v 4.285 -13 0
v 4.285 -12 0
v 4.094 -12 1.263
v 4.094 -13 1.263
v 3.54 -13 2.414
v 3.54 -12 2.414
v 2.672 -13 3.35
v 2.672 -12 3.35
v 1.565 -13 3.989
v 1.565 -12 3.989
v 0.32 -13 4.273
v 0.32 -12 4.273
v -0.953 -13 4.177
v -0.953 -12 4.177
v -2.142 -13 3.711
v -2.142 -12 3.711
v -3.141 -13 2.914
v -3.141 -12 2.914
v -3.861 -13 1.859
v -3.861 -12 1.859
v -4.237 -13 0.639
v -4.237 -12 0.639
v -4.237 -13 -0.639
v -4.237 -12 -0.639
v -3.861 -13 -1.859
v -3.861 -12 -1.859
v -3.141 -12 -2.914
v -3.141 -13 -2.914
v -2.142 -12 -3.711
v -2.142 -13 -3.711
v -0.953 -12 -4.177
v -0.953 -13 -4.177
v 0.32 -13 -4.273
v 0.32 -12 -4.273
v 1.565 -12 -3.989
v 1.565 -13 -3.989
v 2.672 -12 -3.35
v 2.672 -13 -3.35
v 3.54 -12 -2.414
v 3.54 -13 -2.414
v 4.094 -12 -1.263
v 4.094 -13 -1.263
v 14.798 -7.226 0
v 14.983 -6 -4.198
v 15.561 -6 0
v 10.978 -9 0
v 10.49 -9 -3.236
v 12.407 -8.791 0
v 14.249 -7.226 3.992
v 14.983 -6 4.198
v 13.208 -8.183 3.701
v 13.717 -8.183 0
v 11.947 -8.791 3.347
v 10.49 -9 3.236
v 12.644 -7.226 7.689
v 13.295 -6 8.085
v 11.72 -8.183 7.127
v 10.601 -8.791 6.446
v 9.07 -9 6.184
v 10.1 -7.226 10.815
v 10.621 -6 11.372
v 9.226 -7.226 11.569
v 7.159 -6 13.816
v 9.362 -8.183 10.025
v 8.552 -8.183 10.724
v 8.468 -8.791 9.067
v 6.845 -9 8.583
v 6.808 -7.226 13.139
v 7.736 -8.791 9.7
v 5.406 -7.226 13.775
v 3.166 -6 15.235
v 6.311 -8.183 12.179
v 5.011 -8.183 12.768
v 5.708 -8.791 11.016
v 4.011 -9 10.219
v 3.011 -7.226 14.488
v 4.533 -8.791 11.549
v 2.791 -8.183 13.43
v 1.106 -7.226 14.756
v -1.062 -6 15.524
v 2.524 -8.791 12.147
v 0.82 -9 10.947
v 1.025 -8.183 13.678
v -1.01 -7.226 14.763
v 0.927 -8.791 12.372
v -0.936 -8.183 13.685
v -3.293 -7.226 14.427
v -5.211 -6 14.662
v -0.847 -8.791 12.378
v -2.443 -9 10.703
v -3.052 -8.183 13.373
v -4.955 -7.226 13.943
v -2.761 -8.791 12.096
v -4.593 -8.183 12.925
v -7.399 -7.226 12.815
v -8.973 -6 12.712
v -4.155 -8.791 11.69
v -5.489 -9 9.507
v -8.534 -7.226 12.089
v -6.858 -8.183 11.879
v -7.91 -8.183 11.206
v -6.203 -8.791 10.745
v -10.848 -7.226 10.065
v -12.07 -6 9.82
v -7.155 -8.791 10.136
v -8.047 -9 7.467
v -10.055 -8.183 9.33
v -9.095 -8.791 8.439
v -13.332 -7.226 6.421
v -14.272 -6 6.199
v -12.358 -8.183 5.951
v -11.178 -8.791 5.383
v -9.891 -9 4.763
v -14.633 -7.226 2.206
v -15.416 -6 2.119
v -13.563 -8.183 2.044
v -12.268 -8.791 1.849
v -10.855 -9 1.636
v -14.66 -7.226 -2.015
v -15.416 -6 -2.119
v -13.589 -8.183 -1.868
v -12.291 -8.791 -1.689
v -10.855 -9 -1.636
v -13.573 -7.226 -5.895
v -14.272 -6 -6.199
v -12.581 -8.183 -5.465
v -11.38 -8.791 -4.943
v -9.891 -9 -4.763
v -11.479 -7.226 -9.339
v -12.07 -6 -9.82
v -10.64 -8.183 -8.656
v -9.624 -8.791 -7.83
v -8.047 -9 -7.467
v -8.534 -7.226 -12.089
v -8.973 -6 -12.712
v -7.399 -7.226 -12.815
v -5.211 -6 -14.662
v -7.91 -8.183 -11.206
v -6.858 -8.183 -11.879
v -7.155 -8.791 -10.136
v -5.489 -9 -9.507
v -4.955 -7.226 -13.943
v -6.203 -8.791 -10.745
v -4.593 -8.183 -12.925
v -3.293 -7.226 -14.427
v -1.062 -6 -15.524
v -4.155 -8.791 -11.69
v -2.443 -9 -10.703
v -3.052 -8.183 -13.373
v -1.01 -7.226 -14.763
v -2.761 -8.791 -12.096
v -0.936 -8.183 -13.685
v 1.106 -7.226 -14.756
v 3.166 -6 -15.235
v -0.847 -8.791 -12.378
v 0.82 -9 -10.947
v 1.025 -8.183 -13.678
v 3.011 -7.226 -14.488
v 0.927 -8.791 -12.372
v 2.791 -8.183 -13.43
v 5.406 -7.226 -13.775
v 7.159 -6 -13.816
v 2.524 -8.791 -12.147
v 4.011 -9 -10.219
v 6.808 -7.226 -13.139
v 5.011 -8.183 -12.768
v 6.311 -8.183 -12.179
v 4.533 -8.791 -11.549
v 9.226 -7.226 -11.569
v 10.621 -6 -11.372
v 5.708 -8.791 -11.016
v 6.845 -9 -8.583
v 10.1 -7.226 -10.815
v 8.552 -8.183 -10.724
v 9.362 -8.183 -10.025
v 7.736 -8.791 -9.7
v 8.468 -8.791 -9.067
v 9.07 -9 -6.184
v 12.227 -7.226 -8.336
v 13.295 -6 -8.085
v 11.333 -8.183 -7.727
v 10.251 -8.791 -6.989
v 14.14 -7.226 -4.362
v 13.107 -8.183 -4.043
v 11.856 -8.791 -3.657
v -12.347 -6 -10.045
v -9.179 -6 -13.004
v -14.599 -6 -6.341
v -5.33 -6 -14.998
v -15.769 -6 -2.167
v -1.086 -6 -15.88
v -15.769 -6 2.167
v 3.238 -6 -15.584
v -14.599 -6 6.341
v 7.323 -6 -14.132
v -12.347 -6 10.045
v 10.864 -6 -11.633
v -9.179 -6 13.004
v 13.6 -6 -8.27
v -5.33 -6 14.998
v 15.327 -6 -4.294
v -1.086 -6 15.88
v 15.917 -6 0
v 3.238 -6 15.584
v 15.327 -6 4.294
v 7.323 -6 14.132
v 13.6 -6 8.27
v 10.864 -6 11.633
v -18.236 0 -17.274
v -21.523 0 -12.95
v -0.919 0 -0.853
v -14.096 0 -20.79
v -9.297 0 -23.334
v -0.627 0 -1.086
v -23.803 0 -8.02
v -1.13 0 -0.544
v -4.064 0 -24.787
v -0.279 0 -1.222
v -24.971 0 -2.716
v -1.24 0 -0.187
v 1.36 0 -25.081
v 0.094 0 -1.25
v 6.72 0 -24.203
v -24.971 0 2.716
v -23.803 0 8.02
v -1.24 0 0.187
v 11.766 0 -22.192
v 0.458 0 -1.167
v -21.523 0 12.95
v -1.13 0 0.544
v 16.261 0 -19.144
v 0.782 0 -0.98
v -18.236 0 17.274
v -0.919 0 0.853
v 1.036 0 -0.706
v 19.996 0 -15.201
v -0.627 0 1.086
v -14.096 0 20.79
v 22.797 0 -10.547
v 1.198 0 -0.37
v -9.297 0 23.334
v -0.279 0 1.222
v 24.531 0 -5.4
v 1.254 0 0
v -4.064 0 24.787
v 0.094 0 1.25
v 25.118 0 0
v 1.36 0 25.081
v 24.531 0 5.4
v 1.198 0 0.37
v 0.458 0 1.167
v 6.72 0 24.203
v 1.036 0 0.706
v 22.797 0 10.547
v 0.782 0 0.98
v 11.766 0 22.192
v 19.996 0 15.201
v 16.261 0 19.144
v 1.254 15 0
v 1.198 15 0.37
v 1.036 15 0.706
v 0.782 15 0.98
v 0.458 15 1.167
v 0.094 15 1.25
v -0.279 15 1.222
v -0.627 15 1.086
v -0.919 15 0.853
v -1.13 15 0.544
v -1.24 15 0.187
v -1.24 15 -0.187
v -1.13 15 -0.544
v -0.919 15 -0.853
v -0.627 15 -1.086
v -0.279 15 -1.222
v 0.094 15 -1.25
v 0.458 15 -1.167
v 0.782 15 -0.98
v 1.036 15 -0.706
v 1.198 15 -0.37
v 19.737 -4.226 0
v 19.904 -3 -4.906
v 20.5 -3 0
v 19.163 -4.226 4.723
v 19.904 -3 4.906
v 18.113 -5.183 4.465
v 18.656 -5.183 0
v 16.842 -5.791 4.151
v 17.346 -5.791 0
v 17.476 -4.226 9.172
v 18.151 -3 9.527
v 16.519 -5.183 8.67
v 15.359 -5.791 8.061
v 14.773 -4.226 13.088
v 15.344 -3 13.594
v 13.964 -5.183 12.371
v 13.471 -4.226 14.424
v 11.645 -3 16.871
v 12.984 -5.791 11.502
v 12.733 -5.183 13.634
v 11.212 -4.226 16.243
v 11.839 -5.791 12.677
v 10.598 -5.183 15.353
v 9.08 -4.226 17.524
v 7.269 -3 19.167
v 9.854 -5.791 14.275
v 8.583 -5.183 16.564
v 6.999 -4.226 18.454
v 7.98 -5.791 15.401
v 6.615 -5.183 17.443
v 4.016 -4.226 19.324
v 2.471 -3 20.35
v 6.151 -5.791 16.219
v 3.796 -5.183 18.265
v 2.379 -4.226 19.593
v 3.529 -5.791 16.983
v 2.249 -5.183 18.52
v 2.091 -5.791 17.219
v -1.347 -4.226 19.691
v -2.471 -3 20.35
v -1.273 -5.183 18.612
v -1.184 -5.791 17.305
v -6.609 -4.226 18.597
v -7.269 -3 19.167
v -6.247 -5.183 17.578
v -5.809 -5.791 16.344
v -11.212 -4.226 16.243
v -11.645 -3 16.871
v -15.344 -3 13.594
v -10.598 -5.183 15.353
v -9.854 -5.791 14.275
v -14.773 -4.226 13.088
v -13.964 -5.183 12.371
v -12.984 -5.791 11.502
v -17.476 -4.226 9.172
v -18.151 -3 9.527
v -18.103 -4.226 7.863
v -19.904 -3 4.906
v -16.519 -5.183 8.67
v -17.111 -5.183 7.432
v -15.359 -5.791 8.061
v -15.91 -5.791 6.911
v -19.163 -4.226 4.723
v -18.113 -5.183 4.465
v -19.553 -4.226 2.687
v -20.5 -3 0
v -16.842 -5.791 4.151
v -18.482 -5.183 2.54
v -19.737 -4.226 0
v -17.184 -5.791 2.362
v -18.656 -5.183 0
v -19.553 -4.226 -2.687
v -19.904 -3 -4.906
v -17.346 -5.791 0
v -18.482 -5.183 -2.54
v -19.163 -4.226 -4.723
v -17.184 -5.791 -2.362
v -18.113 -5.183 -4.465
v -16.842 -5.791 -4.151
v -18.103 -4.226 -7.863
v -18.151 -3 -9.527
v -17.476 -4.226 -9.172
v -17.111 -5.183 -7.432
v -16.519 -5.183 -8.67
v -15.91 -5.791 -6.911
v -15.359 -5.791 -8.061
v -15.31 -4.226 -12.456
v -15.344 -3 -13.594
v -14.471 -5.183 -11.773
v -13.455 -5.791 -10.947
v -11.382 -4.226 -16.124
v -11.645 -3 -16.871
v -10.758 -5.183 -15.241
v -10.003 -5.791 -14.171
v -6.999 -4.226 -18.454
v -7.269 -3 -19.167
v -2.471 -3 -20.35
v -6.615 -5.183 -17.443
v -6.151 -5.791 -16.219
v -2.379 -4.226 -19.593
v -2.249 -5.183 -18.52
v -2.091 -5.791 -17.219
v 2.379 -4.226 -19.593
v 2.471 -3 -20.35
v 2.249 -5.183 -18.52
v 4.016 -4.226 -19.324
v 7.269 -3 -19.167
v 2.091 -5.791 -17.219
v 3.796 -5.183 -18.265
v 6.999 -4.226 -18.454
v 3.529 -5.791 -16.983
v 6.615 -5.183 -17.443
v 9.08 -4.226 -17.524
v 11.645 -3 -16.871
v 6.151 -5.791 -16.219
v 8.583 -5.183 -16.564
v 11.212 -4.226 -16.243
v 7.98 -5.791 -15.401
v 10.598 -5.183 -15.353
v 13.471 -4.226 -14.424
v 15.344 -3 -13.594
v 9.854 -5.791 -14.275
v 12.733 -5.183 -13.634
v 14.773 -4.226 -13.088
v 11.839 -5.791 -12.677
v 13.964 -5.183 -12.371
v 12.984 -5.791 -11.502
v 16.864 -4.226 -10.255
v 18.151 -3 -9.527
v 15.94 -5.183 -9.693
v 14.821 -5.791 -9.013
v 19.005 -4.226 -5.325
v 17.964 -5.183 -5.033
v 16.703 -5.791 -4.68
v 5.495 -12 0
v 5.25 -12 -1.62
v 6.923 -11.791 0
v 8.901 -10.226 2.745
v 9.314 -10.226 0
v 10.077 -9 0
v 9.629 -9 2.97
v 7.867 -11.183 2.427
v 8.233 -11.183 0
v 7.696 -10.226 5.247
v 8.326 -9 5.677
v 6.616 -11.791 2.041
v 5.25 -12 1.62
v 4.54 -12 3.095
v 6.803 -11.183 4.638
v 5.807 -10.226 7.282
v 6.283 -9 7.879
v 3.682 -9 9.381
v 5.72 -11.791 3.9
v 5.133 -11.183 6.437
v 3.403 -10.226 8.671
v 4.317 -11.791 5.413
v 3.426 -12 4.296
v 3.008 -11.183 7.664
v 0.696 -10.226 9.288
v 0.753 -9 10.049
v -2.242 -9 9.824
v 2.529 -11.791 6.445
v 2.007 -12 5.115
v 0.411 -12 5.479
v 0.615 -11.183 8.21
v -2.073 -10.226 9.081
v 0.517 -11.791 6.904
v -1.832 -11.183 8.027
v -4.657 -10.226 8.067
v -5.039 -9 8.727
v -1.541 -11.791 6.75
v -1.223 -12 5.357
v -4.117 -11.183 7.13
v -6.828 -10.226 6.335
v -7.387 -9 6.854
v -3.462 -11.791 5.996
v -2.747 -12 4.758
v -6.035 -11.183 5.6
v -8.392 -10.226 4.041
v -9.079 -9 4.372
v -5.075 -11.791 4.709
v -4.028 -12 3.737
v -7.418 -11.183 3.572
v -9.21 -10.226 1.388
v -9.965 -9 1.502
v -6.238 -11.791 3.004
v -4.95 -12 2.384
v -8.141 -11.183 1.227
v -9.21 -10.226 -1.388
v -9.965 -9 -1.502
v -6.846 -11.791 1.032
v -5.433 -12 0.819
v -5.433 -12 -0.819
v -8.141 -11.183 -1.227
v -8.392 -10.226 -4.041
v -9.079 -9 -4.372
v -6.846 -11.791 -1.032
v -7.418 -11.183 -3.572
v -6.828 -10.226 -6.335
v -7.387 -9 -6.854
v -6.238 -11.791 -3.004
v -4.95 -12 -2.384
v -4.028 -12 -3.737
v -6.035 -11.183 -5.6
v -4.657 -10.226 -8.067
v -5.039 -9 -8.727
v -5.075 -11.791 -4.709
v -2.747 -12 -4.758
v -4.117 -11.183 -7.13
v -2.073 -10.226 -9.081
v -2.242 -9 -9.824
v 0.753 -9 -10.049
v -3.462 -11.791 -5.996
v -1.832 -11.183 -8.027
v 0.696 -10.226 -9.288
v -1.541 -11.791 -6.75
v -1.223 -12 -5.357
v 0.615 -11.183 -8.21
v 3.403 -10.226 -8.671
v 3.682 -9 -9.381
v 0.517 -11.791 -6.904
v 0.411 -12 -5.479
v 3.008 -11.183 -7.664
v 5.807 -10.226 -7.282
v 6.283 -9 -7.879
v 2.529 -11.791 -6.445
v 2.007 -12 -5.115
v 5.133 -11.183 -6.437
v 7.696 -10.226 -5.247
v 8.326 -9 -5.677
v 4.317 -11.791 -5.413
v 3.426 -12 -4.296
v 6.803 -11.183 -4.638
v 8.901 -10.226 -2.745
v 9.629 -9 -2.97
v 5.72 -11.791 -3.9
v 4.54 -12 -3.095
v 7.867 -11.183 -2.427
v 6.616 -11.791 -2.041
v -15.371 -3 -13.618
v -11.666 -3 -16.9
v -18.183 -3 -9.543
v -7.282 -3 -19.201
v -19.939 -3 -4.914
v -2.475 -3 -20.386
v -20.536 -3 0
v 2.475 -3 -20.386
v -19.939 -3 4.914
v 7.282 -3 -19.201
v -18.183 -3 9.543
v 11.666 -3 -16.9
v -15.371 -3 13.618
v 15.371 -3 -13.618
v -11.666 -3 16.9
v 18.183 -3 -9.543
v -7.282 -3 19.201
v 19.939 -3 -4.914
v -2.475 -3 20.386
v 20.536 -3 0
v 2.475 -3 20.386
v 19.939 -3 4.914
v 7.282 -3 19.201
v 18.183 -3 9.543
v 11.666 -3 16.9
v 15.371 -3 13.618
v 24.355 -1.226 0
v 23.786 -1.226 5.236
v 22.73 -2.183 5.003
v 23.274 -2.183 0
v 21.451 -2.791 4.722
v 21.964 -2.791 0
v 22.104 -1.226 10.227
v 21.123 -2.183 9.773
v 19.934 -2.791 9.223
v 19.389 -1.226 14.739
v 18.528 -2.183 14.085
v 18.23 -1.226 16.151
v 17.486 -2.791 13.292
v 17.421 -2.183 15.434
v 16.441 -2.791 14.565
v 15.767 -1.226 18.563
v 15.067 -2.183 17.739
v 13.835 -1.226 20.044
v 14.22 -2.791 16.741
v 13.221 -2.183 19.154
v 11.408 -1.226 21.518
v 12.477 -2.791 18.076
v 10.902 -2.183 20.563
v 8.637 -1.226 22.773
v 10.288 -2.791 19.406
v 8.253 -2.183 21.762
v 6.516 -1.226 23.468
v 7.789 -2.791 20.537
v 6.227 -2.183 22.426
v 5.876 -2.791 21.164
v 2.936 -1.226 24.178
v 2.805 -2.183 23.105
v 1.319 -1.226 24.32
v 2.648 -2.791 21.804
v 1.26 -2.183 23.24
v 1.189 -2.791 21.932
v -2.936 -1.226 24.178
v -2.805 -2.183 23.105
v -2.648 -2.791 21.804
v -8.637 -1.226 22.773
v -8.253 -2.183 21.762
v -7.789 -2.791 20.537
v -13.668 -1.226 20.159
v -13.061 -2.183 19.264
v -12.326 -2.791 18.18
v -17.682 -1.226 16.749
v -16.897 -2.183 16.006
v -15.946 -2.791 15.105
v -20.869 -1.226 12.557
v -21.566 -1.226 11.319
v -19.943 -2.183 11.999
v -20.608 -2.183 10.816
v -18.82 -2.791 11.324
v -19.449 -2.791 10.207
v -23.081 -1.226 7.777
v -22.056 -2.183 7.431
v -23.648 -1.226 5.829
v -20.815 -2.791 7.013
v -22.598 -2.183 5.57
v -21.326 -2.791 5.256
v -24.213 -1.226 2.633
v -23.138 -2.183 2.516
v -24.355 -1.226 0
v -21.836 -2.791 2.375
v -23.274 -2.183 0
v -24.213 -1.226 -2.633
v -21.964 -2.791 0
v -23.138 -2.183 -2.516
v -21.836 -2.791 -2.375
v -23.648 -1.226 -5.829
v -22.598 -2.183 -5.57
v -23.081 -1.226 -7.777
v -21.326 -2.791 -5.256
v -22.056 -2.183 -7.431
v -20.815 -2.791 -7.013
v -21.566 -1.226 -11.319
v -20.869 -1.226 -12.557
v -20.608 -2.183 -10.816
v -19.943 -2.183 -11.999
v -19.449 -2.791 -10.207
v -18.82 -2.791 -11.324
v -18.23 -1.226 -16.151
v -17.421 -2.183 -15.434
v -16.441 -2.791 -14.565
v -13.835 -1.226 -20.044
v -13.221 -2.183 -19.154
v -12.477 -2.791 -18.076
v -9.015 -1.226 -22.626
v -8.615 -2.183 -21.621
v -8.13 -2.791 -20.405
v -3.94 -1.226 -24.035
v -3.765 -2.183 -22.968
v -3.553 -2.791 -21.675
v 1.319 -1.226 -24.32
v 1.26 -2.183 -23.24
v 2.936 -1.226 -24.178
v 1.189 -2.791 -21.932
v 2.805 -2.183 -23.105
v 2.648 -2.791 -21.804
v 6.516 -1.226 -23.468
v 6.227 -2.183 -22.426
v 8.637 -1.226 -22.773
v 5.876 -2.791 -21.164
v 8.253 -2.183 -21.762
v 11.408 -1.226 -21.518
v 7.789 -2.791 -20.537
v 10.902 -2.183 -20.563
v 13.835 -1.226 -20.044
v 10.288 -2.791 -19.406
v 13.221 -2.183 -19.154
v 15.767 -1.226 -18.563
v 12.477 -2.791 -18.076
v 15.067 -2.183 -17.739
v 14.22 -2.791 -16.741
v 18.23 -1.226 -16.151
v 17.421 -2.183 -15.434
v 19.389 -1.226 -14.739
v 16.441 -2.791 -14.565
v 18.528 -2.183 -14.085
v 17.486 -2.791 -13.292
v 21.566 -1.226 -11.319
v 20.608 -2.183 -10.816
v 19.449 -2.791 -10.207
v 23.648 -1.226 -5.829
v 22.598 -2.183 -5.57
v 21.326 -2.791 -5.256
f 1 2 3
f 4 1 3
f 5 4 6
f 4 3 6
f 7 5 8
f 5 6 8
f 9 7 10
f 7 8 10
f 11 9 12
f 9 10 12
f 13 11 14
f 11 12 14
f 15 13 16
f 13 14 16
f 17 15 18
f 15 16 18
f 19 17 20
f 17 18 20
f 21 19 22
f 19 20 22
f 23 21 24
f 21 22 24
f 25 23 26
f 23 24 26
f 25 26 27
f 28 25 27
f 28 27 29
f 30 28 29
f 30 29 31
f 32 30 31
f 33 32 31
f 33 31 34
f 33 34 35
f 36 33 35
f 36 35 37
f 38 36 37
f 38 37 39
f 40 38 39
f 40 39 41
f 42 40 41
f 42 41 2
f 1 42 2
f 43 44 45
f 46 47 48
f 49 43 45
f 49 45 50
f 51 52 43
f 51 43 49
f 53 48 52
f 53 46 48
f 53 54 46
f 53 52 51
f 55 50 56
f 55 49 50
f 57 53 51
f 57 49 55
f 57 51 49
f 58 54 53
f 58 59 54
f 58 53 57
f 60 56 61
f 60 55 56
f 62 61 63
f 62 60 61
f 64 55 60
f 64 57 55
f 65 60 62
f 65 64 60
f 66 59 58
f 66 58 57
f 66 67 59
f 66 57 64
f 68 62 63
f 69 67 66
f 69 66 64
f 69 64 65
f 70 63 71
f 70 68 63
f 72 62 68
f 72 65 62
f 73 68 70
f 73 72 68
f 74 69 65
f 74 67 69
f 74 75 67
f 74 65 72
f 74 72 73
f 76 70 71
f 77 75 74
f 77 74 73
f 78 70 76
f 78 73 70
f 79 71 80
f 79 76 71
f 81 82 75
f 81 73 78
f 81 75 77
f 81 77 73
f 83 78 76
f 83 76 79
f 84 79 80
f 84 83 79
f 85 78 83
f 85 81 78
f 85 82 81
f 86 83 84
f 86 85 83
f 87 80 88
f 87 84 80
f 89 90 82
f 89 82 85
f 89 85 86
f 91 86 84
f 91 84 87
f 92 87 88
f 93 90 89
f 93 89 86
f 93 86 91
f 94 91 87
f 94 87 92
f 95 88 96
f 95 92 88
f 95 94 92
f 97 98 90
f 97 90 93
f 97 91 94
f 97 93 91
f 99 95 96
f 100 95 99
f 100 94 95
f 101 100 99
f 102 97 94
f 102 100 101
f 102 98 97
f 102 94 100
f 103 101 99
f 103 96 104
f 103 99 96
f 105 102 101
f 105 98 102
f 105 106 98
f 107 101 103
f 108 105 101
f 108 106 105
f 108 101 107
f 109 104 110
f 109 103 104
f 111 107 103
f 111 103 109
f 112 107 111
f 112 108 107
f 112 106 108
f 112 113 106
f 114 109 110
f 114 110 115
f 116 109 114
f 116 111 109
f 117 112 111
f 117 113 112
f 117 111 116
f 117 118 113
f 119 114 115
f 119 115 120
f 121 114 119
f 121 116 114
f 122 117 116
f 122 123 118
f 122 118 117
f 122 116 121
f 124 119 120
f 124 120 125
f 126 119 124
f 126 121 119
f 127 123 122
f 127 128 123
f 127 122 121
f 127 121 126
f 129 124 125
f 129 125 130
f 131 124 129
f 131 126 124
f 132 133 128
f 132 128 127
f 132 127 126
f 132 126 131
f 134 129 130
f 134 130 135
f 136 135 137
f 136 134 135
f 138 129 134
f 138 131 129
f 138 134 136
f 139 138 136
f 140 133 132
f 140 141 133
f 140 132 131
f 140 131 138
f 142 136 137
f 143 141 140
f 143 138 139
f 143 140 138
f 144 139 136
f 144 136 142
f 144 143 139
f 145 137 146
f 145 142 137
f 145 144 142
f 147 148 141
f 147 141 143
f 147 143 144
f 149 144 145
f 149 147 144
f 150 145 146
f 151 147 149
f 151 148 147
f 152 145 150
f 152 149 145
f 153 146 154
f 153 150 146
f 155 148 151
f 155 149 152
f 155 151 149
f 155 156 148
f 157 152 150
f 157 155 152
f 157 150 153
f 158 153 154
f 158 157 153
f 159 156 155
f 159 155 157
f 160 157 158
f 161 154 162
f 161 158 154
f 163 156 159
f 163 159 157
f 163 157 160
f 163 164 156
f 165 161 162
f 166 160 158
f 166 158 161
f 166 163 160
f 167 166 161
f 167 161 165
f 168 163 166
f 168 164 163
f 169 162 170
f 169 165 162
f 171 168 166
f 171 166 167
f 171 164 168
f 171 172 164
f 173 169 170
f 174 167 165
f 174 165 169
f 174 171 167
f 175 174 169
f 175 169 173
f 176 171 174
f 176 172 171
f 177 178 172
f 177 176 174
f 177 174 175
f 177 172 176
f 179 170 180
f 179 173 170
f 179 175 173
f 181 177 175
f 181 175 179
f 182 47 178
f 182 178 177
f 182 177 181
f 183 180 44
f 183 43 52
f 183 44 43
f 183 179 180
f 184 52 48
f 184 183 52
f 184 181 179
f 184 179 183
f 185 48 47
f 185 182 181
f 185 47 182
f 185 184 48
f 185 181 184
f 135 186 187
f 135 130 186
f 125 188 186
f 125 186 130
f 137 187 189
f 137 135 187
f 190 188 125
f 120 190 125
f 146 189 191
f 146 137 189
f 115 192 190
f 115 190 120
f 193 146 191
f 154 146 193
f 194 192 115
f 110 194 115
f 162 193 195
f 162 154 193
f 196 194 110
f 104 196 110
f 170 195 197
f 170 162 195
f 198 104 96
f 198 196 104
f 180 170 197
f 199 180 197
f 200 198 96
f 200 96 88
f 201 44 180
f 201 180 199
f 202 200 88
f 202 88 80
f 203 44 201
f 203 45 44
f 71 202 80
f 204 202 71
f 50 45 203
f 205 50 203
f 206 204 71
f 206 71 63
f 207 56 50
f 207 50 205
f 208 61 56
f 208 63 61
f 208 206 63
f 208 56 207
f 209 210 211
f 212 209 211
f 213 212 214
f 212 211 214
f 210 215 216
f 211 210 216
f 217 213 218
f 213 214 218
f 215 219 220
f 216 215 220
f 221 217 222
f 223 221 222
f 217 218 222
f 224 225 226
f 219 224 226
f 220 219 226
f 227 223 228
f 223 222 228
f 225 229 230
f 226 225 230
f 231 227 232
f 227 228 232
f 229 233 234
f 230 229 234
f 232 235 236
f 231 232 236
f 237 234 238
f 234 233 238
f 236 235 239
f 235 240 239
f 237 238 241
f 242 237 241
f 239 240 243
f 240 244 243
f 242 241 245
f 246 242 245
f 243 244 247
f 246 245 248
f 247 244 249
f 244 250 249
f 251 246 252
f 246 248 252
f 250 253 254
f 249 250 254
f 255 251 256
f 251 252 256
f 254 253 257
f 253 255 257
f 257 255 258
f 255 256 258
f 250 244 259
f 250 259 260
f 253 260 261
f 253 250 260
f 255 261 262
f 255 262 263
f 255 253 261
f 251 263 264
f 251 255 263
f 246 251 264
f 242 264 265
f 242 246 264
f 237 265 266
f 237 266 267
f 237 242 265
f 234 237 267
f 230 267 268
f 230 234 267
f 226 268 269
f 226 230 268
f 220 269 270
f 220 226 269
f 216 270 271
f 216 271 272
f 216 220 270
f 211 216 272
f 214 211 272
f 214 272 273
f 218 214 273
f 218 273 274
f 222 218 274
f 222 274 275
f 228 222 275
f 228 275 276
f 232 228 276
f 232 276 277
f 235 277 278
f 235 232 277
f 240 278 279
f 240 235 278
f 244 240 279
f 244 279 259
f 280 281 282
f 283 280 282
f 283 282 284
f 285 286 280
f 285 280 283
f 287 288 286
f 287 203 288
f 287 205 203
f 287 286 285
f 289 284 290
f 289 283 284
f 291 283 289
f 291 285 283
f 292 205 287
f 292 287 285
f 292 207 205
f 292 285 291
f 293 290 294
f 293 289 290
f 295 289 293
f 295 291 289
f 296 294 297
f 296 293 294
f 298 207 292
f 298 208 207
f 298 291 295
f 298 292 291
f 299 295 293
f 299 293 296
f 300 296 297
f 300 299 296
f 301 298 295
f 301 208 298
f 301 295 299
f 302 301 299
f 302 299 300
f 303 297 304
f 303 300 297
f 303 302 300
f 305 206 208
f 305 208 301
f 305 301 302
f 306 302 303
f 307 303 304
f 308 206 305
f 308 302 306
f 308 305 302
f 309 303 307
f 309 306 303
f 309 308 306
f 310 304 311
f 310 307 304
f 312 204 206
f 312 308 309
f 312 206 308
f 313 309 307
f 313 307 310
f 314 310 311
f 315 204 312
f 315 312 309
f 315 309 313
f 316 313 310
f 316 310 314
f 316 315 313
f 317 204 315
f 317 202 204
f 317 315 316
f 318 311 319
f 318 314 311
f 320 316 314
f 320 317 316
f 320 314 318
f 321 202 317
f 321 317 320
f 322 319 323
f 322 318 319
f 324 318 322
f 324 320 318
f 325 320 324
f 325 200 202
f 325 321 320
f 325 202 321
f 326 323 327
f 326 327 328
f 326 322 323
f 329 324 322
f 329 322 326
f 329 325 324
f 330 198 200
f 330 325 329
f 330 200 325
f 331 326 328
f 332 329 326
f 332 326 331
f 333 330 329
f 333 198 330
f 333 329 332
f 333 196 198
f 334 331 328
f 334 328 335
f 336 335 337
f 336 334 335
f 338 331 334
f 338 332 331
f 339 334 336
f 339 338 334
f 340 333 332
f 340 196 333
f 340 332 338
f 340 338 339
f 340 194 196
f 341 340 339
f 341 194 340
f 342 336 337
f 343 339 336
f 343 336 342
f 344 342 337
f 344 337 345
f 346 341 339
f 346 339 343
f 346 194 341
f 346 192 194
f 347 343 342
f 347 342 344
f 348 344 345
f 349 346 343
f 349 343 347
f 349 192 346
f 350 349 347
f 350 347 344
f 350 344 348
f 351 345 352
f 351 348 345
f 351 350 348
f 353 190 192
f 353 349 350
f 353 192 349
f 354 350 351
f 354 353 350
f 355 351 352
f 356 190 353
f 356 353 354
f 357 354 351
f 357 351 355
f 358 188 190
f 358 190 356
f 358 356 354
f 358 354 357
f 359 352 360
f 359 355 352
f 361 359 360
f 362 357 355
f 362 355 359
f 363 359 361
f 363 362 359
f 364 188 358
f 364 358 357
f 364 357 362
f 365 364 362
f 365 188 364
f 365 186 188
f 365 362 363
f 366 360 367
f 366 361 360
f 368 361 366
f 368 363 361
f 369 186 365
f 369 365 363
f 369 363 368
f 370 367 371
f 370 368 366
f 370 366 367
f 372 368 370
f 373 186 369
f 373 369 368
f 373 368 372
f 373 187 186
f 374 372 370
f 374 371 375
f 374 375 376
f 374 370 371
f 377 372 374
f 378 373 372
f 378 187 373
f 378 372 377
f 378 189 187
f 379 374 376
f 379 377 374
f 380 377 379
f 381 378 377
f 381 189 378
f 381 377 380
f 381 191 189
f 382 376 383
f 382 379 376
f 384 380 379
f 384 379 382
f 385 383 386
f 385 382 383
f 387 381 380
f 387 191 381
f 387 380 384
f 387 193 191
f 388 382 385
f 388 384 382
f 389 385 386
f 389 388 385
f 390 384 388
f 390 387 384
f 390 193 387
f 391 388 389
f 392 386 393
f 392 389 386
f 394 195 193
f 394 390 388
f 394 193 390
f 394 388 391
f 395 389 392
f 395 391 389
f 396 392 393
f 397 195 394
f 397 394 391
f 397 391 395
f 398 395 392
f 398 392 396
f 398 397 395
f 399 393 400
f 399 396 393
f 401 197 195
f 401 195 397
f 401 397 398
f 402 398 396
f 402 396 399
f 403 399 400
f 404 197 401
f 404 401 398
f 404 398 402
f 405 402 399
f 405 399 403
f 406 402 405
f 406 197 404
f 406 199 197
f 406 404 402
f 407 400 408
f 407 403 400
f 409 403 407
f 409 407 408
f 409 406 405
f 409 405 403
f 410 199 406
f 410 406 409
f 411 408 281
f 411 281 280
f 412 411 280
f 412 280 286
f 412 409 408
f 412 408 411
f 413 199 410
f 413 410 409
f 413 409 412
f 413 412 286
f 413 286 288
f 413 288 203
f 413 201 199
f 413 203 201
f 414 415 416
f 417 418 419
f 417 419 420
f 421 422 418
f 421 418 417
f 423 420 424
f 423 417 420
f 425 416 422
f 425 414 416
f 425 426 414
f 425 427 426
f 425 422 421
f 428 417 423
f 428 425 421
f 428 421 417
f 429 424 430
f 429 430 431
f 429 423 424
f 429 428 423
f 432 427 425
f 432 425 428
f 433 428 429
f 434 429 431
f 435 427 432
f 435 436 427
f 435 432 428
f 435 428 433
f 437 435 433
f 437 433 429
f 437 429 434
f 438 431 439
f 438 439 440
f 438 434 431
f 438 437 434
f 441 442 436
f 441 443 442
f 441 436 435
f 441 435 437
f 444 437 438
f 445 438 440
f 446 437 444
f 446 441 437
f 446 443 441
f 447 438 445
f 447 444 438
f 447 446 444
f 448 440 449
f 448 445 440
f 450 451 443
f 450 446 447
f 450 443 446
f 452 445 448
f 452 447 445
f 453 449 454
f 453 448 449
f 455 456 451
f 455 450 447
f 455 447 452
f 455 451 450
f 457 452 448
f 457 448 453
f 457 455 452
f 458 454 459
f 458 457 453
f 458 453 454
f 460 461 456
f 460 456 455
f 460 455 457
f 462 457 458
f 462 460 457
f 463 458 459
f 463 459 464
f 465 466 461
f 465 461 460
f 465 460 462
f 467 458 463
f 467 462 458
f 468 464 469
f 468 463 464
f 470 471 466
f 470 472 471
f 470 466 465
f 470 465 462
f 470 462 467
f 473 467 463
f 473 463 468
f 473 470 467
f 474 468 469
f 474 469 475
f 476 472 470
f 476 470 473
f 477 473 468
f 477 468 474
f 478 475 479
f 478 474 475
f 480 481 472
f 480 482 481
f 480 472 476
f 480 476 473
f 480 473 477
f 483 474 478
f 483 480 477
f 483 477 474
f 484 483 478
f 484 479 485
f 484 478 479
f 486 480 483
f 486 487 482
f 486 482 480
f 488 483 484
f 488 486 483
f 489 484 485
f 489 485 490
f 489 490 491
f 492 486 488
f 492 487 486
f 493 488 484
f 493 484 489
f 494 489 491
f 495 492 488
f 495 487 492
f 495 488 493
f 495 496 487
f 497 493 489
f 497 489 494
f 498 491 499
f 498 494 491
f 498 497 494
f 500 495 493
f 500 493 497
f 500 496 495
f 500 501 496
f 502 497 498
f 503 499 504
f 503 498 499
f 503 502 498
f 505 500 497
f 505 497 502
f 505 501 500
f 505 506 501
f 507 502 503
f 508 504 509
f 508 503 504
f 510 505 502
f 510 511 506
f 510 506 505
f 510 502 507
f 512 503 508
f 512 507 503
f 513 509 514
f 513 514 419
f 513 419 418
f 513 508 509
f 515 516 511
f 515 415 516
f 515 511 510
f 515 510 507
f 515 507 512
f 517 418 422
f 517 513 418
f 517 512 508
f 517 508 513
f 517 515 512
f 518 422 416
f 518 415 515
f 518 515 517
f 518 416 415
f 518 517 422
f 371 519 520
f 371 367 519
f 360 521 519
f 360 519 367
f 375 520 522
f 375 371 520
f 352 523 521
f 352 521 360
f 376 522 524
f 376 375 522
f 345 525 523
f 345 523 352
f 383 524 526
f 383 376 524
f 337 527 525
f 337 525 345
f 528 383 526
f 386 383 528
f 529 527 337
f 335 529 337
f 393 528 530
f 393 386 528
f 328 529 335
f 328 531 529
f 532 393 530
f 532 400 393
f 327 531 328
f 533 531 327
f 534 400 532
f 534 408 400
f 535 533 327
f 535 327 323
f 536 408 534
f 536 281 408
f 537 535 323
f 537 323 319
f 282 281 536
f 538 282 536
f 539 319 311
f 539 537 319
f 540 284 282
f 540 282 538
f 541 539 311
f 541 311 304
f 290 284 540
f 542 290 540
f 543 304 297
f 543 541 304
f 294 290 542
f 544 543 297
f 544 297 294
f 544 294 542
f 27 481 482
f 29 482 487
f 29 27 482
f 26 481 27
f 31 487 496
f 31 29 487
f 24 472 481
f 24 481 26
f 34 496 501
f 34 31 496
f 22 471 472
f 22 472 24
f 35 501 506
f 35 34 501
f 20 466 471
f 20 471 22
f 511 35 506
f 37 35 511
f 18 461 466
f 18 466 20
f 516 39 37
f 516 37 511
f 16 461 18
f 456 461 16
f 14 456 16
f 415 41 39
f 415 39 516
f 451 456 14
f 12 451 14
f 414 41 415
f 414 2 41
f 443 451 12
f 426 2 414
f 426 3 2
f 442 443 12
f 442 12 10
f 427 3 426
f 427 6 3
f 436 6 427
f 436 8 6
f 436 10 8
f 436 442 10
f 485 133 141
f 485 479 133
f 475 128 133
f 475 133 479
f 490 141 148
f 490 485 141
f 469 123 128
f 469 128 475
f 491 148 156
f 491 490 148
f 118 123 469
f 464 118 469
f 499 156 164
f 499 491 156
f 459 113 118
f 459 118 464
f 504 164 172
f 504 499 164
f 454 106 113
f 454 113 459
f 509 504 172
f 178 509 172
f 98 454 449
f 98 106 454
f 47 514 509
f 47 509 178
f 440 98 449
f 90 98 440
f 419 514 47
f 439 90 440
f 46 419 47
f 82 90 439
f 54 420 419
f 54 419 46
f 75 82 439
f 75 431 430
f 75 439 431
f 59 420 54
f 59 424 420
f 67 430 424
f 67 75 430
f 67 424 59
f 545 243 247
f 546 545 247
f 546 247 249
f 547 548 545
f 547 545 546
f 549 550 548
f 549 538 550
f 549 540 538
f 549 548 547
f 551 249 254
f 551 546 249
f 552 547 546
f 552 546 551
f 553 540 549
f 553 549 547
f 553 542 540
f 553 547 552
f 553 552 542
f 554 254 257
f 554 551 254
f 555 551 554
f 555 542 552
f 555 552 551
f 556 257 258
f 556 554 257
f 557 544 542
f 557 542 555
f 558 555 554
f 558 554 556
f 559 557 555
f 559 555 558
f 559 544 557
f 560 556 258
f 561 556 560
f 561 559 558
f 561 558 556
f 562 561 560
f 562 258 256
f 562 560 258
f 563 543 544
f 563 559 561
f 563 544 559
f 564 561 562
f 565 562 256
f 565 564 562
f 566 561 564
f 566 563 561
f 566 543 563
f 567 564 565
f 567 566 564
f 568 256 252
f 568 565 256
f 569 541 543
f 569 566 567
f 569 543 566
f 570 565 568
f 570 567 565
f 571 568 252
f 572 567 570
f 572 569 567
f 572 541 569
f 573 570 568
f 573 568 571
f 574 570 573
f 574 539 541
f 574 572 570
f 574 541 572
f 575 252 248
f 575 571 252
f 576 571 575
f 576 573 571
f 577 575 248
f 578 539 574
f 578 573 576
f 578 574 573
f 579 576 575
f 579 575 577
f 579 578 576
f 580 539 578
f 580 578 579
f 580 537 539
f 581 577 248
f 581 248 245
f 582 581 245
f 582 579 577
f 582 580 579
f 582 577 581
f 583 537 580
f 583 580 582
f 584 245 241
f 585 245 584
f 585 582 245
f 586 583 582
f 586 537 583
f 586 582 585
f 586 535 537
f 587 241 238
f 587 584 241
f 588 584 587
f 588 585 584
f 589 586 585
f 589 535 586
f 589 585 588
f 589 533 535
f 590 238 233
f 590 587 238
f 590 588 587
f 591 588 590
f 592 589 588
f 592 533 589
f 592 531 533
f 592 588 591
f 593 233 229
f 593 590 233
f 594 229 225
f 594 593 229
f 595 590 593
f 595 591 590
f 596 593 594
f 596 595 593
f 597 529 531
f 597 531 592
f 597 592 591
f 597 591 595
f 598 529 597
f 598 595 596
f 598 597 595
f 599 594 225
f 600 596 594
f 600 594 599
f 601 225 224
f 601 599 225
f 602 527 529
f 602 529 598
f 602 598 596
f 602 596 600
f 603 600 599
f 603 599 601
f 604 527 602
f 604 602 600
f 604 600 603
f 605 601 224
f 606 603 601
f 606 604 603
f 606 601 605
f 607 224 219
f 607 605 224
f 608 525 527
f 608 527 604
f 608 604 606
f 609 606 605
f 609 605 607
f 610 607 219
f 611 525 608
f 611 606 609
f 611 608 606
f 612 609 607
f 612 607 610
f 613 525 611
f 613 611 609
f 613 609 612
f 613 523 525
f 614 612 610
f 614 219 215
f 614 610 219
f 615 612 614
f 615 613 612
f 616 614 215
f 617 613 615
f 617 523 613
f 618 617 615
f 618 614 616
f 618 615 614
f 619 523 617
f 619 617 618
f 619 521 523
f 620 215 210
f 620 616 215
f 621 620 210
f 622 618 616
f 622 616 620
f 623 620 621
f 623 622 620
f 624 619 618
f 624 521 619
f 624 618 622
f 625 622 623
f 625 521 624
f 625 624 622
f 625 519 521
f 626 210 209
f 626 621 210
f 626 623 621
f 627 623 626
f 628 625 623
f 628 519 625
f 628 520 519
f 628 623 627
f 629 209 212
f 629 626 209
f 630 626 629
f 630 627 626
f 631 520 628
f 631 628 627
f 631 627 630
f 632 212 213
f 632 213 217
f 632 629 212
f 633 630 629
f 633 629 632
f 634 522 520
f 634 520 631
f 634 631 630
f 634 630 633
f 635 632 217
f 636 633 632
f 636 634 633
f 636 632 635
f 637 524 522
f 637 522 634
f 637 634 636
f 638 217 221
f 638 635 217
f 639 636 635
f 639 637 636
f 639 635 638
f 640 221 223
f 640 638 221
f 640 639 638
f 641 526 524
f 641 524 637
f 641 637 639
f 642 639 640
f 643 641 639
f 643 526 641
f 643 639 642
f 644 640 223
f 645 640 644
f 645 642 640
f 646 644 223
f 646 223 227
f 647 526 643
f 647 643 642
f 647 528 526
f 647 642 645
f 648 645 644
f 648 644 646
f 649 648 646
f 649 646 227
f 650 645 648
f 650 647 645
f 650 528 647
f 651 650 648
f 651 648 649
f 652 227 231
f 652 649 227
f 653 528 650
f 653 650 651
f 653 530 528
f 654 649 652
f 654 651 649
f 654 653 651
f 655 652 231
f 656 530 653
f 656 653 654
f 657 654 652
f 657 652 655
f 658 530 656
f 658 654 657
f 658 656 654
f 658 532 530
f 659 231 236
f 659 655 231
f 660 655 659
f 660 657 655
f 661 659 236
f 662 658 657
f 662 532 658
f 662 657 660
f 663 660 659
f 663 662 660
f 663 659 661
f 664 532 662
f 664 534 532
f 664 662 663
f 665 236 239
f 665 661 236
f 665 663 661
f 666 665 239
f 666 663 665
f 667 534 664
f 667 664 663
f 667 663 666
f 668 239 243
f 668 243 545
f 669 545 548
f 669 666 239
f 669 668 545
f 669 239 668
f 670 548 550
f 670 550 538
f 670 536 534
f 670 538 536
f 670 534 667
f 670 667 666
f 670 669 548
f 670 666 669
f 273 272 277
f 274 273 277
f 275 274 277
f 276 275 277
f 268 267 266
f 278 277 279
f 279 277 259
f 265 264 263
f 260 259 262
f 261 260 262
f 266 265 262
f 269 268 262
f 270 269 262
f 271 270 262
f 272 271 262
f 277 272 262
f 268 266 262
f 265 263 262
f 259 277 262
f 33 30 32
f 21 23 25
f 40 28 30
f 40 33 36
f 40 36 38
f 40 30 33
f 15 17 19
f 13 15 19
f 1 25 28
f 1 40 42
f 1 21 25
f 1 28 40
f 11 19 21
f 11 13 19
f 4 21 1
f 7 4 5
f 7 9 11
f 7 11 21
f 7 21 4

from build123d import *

# Parameters (mm, degrees)
F0_R     = 25.1181711361
F0_R_2   = 20.4995111856
F1_DEPTH = 3
F0_R_3   = 15.560509686
F2_DEPTH = 6
F0_R_4   = 10.0770984701
F3_DEPTH = 9
F0_R_5   = 4.2848341216
F4_DEPTH = 12
F0_R_6   = 1.2539122761
F5_DEPTH = 13
F6_DEPTH = 13
F7_DEPTH = 15


# Not quite as in the source:
# - a fillet or chamfer that OpenCascade refuses, or shapes differently, is made with other operations: its cross-section is extruded or revolved along the edge and cut away or added


with BuildPart() as f1:
    # F0 (on Front) → F1 (new body)
    with BuildSketch(Plane.XZ):
        Circle(F0_R)
        Circle(F0_R_2, mode=Mode.SUBTRACT)
    extrude(amount=F1_DEPTH)

    # F0 (on Front) → F2 (join)
    with BuildSketch(Plane.XZ):
        Circle(F0_R_2)
        Circle(F0_R_3, mode=Mode.SUBTRACT)
    extrude(amount=F2_DEPTH)

    # F0 (on Front) → F3 (join)
    with BuildSketch(Plane.XZ):
        Circle(F0_R_3)
        Circle(F0_R_4, mode=Mode.SUBTRACT)
    extrude(amount=F3_DEPTH)

    # F0 (on Front) → F4 (join)
    with BuildSketch(Plane.XZ):
        Circle(F0_R_4)
        Circle(F0_R_5, mode=Mode.SUBTRACT)
    extrude(amount=F4_DEPTH)

    # F0 (on Front) → F5 (join)
    with BuildSketch(Plane.XZ):
        Circle(F0_R_5)
        Circle(F0_R_6, mode=Mode.SUBTRACT)
    extrude(amount=F5_DEPTH)

    # F0 (on Front) → F6 (join)
    with BuildSketch(Plane.XZ):
        Circle(F0_R_6)
    extrude(amount=F6_DEPTH)

    # F0 (on Front) → F7 (join)
    with BuildSketch(Plane.XZ):
        Circle(F0_R_6)
    extrude(amount=-F7_DEPTH)

    # F8: fillet of radius 5 on 4 edges, made by hand

    # F8_s1 → F8_t2 (revolve, cut)
    with BuildSketch(Plane.XY):
        with BuildLine():
            ThreePointArc((25.1181711361, 0), (23.2742082286, -2.1833001327), (20.5355954411, -3))
            Line((20.5355954411, -3), (25.1181711361, -3))
            Line((25.1181711361, -3), (25.1181711361, 0))
        make_face()
    revolve(axis=Axis((0, -3, 0), (0, -1, 0)), mode=Mode.SUBTRACT)

    # F8_s3 → F8_t4 (revolve, cut)
    with BuildSketch(Plane.XY):
        with BuildLine():
            ThreePointArc((20.4995111856, -3), (18.6555482782, -5.1833001327), (15.9169354907, -6))
            Line((15.9169354907, -6), (20.4995111856, -6))
            Line((20.4995111856, -6), (20.4995111856, -3))
        make_face()
    revolve(axis=Axis((0, -6, 0), (0, -1, 0)), mode=Mode.SUBTRACT)

    # F8_s5 → F8_t6 (revolve, cut)
    with BuildSketch(Plane.XY):
        with BuildLine():
            ThreePointArc((15.560509686, -6), (13.7165467785, -8.1833001327), (10.977933991, -9))
            Line((10.977933991, -9), (15.560509686, -9))
            Line((15.560509686, -9), (15.560509686, -6))
        make_face()
    revolve(axis=Axis((0, -9, 0), (0, -1, 0)), mode=Mode.SUBTRACT)

    # F8_s7 → F8_t8 (revolve, cut)
    with BuildSketch(Plane.XY):
        with BuildLine():
            ThreePointArc((10.0770984701, -9), (8.2331355627, -11.1833001327), (5.4945227752, -12))
            Line((5.4945227752, -12), (10.0770984701, -12))
            Line((10.0770984701, -12), (10.0770984701, -9))
        make_face()
    revolve(axis=Axis((0, -12, 0), (0, -1, 0)), mode=Mode.SUBTRACT)


solid = f1.part
